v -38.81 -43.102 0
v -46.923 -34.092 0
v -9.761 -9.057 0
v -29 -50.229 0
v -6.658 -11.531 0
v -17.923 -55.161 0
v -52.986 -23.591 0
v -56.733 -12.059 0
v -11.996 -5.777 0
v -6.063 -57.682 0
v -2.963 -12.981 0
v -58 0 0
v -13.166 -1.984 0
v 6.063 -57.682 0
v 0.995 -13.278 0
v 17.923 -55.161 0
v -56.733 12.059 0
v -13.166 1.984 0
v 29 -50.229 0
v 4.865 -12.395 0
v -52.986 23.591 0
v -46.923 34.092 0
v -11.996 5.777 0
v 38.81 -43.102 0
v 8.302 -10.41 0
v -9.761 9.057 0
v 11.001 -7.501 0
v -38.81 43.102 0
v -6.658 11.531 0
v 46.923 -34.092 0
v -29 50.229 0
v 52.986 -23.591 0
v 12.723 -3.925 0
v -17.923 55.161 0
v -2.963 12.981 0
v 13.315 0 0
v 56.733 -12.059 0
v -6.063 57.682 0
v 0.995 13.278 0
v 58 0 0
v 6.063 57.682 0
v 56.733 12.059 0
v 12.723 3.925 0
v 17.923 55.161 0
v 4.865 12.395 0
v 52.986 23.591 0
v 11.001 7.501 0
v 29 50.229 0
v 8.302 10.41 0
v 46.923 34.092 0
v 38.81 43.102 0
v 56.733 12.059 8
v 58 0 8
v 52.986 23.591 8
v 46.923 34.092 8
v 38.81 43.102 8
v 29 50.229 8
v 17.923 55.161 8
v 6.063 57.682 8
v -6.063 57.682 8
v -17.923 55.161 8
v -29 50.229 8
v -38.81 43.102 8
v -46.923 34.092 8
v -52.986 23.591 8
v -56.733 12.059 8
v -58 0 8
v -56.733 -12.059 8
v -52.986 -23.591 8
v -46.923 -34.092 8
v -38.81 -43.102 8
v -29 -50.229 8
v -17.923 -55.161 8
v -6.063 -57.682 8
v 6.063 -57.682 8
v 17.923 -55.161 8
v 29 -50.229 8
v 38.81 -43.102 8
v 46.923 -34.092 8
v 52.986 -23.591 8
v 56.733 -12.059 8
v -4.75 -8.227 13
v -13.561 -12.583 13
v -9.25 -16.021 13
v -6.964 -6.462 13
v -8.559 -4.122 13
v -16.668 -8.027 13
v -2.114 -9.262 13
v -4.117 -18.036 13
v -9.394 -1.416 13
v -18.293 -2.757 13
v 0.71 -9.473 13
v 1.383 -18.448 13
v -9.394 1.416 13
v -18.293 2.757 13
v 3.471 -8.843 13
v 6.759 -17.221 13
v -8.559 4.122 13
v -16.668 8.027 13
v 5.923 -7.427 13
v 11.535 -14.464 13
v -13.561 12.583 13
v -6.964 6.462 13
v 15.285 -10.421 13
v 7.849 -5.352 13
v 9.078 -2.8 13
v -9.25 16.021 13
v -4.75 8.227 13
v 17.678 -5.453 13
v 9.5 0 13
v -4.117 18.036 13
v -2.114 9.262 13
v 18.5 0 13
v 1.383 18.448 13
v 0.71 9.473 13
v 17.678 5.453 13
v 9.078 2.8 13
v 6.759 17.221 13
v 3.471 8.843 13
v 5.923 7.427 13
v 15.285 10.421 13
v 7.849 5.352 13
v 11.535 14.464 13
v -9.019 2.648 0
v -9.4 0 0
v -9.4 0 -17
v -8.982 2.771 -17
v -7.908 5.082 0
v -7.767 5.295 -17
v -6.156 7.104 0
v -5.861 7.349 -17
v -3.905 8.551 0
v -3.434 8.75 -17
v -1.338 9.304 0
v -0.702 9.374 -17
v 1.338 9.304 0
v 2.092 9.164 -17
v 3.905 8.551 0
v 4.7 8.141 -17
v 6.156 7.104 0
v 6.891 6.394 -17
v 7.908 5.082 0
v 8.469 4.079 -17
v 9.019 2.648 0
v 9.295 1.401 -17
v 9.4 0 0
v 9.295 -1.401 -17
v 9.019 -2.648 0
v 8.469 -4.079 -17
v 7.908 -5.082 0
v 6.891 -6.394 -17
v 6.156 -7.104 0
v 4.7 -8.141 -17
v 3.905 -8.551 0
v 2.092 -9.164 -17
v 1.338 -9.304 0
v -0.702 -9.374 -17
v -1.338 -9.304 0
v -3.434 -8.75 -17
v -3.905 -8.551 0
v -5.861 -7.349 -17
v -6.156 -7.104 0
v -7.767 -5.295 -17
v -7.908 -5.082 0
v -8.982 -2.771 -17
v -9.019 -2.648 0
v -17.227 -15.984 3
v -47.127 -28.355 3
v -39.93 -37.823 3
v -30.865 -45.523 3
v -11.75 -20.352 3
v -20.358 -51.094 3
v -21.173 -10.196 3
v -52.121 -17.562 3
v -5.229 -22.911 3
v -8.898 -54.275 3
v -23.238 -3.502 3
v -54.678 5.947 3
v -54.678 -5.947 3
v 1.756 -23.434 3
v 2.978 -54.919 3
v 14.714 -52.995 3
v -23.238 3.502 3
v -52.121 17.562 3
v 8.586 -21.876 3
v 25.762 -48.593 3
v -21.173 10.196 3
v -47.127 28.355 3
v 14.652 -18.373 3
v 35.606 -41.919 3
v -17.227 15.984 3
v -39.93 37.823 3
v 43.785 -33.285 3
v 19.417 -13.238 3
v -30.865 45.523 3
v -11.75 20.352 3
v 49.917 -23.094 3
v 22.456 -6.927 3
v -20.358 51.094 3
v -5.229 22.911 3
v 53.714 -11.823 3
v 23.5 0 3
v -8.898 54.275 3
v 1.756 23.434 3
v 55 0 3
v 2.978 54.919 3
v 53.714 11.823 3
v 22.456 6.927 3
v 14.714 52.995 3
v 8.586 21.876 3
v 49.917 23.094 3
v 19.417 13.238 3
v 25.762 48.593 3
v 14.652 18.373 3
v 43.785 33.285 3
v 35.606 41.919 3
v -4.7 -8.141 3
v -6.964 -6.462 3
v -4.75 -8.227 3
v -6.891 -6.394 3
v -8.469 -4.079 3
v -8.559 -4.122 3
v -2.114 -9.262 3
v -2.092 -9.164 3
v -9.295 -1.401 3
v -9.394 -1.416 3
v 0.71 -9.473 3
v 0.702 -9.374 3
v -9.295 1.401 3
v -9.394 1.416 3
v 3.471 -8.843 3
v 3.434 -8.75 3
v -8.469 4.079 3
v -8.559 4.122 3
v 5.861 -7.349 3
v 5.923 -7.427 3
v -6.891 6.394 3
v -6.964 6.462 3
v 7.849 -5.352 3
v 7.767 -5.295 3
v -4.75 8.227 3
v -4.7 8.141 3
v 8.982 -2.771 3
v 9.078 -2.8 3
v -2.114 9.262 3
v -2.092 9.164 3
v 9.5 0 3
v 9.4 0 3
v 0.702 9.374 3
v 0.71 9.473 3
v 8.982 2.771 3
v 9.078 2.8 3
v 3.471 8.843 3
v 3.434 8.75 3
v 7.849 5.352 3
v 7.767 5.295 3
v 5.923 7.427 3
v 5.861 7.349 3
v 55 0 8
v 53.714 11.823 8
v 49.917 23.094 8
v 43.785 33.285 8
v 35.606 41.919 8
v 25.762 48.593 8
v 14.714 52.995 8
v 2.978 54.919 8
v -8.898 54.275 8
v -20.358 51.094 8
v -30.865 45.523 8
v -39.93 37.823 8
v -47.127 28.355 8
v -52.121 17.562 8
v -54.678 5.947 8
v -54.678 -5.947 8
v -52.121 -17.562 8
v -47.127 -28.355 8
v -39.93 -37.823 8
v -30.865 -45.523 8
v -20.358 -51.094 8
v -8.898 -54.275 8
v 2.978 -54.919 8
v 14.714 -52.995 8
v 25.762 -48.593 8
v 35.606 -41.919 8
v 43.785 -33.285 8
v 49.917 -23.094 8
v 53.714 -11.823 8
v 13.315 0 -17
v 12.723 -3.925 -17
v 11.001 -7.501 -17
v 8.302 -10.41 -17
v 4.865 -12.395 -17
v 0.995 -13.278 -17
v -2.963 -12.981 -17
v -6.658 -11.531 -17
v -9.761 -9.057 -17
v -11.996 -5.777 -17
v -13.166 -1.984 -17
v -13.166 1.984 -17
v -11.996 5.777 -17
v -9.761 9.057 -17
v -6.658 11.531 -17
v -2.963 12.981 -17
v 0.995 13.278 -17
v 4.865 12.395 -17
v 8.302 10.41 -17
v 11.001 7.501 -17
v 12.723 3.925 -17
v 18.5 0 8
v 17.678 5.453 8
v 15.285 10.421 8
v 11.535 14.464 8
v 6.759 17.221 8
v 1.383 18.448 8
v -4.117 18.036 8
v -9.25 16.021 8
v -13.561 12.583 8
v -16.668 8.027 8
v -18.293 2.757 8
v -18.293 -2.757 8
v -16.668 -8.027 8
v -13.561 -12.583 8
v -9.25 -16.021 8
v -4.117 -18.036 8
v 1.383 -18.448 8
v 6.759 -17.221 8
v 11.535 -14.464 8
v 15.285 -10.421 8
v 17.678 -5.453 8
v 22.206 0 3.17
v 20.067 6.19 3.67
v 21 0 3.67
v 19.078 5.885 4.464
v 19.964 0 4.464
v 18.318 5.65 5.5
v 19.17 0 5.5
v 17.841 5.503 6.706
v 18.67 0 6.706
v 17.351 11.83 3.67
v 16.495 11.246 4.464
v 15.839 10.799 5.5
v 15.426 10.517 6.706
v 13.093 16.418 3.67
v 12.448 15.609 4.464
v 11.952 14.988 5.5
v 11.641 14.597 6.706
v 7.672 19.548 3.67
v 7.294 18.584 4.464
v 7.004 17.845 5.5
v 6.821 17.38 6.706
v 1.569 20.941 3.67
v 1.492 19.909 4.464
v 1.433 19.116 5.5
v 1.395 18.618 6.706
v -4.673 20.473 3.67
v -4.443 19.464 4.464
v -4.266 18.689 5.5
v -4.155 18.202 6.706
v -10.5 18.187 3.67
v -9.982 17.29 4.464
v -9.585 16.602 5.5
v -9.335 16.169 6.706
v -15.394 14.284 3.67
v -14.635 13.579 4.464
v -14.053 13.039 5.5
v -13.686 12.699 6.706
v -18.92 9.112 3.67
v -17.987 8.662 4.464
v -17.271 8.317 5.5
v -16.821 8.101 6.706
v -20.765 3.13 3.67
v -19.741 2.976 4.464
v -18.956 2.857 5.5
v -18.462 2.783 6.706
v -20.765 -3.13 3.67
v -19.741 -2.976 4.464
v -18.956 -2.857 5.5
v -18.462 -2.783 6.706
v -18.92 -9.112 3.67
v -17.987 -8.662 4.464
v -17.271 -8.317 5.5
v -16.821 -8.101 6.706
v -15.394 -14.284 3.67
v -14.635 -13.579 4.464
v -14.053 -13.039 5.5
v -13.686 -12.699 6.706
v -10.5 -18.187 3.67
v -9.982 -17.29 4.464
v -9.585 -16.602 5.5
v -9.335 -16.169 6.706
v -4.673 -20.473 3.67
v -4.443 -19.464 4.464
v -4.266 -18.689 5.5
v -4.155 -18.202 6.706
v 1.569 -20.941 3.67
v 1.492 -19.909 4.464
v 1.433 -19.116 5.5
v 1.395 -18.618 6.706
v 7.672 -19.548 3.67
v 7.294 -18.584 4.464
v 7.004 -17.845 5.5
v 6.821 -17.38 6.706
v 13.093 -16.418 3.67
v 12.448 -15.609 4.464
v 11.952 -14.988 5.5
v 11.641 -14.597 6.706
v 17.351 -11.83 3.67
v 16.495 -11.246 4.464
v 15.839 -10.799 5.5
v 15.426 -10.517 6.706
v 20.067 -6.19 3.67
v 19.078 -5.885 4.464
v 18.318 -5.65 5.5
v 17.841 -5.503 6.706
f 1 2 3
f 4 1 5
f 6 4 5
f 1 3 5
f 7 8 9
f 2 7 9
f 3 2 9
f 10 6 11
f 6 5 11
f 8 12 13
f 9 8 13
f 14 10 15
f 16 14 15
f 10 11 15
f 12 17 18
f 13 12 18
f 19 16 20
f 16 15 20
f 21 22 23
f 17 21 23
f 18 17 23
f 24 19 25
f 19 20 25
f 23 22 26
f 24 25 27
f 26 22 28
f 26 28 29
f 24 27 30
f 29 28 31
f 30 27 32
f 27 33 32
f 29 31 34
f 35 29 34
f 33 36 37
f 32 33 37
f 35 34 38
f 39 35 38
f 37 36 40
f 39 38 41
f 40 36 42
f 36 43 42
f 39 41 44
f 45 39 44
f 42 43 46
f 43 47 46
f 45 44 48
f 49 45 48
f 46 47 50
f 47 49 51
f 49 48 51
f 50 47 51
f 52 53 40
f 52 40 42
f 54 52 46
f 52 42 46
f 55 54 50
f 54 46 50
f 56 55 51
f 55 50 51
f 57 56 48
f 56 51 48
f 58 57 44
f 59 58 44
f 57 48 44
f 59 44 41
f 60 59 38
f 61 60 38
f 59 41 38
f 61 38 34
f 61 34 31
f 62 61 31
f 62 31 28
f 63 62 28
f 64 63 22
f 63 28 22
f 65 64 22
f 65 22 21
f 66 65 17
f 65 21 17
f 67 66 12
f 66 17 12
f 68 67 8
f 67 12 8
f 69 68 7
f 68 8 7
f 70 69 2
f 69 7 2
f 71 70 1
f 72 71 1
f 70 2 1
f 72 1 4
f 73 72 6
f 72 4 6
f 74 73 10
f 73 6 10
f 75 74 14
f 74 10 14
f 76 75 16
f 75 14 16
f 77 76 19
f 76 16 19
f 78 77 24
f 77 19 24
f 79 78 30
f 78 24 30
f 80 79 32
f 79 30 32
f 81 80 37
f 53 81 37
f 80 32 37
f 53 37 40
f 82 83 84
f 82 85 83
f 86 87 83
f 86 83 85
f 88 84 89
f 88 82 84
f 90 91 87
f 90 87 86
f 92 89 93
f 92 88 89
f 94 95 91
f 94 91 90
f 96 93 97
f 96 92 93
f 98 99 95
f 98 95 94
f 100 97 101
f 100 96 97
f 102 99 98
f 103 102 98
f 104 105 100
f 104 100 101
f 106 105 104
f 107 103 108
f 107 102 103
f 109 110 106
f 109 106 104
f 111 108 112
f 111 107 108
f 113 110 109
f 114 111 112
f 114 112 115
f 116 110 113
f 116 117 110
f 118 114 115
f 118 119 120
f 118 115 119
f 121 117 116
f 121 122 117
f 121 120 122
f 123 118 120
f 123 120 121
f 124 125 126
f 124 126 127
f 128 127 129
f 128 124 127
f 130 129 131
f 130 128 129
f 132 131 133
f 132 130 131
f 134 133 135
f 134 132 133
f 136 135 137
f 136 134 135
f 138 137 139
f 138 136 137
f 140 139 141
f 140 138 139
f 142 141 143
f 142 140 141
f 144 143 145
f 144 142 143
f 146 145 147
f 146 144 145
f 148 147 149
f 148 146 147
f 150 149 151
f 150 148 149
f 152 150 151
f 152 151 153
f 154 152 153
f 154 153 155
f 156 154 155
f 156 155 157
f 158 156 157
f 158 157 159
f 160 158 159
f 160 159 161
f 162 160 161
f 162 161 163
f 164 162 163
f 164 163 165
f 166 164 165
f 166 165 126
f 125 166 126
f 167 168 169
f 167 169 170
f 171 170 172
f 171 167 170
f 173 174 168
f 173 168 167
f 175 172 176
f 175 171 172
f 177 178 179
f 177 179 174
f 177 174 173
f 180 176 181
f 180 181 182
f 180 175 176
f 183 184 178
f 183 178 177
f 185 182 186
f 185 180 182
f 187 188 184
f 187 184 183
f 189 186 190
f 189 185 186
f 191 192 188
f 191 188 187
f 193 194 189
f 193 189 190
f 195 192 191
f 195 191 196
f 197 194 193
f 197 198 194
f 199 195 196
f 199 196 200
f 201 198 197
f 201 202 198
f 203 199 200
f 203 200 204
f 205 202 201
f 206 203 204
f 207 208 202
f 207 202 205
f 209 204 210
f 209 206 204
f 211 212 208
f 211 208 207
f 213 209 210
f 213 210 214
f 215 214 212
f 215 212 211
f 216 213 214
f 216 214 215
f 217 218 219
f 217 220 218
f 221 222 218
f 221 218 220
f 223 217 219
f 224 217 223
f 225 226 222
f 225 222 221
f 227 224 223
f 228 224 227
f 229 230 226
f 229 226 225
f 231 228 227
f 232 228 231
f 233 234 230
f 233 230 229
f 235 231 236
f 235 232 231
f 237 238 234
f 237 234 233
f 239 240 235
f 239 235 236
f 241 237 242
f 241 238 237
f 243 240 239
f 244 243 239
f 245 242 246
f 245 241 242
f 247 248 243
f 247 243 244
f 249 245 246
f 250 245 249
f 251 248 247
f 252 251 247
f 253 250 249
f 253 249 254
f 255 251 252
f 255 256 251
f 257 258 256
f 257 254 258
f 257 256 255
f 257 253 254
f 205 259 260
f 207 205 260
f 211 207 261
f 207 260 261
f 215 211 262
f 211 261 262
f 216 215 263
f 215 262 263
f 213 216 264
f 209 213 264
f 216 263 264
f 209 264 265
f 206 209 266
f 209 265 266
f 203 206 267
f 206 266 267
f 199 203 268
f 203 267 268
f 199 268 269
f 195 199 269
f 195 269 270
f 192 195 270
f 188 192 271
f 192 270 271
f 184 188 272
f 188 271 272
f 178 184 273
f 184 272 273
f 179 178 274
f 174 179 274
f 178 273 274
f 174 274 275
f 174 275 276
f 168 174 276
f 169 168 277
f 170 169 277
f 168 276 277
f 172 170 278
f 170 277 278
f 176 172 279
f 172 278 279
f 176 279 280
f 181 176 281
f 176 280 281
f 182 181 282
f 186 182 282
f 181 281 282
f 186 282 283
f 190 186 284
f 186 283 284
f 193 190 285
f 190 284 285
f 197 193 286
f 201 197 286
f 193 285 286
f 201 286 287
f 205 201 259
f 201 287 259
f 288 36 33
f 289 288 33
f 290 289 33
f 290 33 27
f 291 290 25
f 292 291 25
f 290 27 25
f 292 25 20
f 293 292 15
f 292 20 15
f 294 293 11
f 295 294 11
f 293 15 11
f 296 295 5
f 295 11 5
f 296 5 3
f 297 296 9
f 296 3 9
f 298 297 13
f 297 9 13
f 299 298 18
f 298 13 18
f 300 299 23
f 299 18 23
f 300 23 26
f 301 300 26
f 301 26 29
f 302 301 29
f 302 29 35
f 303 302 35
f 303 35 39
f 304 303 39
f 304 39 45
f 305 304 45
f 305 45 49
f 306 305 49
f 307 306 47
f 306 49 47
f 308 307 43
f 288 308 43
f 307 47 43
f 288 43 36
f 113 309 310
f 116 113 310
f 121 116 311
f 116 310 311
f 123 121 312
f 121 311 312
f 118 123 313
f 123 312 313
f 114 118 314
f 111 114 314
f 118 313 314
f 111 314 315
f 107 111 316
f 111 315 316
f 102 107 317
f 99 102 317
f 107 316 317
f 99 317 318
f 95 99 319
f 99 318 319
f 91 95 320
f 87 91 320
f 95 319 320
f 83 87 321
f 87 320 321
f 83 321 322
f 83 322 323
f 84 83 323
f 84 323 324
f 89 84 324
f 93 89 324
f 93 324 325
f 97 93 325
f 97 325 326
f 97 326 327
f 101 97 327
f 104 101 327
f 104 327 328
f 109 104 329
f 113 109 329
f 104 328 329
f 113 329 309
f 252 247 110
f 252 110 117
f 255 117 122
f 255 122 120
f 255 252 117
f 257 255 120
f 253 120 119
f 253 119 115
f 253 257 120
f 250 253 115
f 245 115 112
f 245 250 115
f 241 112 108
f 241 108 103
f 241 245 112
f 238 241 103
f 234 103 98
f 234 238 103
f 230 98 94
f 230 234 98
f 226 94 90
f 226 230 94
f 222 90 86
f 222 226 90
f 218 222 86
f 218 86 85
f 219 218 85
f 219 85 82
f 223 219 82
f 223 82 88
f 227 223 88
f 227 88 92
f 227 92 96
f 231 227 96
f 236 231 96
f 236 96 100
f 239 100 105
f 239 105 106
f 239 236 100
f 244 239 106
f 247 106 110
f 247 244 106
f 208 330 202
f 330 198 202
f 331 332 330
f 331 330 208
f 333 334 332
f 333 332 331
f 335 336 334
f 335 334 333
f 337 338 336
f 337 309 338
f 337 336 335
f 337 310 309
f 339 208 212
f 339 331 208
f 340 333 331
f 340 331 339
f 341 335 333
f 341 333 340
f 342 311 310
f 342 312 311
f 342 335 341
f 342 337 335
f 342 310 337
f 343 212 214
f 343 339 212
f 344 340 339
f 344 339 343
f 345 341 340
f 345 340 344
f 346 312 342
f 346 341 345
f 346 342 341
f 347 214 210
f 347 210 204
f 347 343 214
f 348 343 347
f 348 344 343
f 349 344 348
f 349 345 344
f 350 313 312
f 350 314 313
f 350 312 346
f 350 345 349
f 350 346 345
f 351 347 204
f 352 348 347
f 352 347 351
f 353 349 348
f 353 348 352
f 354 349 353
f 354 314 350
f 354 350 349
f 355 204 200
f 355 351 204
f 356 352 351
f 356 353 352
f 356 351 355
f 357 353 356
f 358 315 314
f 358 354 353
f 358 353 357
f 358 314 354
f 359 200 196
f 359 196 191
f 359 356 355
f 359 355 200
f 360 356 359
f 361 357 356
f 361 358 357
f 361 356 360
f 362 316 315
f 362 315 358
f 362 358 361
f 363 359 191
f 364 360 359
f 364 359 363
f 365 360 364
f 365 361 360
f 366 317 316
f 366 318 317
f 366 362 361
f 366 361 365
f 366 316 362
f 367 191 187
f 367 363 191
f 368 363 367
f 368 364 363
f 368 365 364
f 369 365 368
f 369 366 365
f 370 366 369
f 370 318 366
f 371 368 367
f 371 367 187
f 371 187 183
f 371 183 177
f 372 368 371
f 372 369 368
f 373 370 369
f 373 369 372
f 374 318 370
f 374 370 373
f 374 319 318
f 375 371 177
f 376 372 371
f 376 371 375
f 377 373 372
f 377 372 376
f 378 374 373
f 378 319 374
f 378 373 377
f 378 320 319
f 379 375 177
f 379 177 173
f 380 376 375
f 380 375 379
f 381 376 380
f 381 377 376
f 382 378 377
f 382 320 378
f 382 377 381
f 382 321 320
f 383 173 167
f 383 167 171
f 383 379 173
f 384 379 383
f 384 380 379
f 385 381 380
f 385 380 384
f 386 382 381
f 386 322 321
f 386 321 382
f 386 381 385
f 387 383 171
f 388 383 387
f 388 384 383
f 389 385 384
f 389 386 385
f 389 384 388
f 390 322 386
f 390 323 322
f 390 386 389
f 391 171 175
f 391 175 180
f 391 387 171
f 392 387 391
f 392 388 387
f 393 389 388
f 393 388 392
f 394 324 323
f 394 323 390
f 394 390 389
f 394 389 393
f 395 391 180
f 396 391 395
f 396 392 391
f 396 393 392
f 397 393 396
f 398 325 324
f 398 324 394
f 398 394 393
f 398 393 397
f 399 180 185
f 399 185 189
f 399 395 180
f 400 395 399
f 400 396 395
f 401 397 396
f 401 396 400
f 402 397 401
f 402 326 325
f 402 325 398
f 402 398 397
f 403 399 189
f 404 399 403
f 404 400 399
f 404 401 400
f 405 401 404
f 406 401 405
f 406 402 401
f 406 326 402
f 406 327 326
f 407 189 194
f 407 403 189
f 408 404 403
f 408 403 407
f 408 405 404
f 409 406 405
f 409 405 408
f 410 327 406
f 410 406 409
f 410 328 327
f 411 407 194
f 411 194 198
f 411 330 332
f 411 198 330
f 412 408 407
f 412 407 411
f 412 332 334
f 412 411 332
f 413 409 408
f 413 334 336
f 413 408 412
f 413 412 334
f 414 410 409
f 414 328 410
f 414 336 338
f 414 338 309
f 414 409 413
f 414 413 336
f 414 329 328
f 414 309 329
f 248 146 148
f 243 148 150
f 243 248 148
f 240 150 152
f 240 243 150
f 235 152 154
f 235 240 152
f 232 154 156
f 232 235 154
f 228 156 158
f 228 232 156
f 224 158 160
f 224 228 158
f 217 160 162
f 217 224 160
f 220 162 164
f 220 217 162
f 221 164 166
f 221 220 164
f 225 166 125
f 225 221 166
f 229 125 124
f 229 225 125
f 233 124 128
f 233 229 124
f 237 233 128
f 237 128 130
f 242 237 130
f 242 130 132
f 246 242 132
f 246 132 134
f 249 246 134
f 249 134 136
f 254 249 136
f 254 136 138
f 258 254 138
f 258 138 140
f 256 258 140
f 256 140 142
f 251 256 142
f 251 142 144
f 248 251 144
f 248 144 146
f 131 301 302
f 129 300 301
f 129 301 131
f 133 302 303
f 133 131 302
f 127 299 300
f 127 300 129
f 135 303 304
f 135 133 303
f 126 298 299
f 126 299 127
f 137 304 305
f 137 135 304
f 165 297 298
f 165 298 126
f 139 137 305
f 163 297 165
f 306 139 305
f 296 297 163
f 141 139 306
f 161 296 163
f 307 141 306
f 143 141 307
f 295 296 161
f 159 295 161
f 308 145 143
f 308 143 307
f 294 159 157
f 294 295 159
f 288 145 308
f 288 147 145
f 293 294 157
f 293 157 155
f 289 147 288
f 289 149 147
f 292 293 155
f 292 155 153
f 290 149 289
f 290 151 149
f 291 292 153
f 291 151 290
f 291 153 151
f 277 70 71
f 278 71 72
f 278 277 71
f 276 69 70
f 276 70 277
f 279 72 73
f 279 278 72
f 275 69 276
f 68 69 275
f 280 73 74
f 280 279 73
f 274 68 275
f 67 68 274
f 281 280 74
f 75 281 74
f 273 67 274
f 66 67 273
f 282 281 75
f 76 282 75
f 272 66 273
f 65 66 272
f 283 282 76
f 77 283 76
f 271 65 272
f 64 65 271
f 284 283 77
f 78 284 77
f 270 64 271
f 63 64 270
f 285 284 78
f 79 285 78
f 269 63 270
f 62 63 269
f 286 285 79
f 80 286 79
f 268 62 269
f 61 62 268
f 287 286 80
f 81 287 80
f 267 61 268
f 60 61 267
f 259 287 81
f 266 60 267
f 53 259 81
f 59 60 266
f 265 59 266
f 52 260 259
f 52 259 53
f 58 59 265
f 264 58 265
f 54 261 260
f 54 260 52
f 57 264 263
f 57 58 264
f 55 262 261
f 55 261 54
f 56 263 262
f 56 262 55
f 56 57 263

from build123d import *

# Parameters (mm, degrees)
SKETCH1_R           = 58
BOSS_EXTRUDE1_DEPTH = 8
SKETCH2_R           = 55
CUT_EXTRUDE1_DEPTH  = 5
SKETCH3_R           = 18.5
SKETCH3_R_2         = 9.5
BOSS_EXTRUDE2_DEPTH = 10
FILLET1_R           = 5
SKETCH4_R           = 13.315
SKETCH4_R_2         = 9.4
BOSS_EXTRUDE3_DEPTH = 17
CUT_EXTRUDE2_START  = -17
SKETCH5_R           = 9.4
CUT_EXTRUDE2_DEPTH  = 17


with BuildPart() as part:
    # Sketch1 → Boss-Extrude1 (new body)
    with BuildSketch(Plane.XY):
        Circle(SKETCH1_R)
    extrude(amount=BOSS_EXTRUDE1_DEPTH)

    # Sketch2 → Cut-Extrude1 (cut)
    with BuildSketch(Plane.XY.offset(8)):
        Circle(SKETCH2_R)
    extrude(amount=-CUT_EXTRUDE1_DEPTH, mode=Mode.SUBTRACT)

    # Sketch3 → Boss-Extrude2 (add)
    with BuildSketch(Plane.XY.offset(3)):
        Circle(SKETCH3_R)
        Circle(SKETCH3_R_2, mode=Mode.SUBTRACT)
    extrude(amount=BOSS_EXTRUDE2_DEPTH)

    # Fillet1
    fillet1_edges = [part.edges().sort_by_distance(p)[0] for p in [
        (-18.5, 0, 3),
    ]]
    fillet(fillet1_edges, radius=FILLET1_R)

    # Sketch4 → Boss-Extrude3 (add)
    with BuildSketch(Plane(origin=(0, 0, 0), x_dir=(-1, 0, 0), z_dir=(0, 0, -1))):
        with Locations(Location((0, 0, 0), (0, 0, 180))):
            Circle(SKETCH4_R)
        Circle(SKETCH4_R_2, mode=Mode.SUBTRACT)
    extrude(amount=BOSS_EXTRUDE3_DEPTH)

    # Sketch5 → Cut-Extrude2 (cut)
    with BuildSketch(Plane(origin=(0, 0, 0), x_dir=(-1, 0, 0), z_dir=(0, 0, -1)).offset(CUT_EXTRUDE2_START)):
        with Locations(Location((0, 0, 0), (0, 0, 180))):
            Circle(SKETCH5_R)
    extrude(amount=CUT_EXTRUDE2_DEPTH, mode=Mode.SUBTRACT)


solid = part.part
